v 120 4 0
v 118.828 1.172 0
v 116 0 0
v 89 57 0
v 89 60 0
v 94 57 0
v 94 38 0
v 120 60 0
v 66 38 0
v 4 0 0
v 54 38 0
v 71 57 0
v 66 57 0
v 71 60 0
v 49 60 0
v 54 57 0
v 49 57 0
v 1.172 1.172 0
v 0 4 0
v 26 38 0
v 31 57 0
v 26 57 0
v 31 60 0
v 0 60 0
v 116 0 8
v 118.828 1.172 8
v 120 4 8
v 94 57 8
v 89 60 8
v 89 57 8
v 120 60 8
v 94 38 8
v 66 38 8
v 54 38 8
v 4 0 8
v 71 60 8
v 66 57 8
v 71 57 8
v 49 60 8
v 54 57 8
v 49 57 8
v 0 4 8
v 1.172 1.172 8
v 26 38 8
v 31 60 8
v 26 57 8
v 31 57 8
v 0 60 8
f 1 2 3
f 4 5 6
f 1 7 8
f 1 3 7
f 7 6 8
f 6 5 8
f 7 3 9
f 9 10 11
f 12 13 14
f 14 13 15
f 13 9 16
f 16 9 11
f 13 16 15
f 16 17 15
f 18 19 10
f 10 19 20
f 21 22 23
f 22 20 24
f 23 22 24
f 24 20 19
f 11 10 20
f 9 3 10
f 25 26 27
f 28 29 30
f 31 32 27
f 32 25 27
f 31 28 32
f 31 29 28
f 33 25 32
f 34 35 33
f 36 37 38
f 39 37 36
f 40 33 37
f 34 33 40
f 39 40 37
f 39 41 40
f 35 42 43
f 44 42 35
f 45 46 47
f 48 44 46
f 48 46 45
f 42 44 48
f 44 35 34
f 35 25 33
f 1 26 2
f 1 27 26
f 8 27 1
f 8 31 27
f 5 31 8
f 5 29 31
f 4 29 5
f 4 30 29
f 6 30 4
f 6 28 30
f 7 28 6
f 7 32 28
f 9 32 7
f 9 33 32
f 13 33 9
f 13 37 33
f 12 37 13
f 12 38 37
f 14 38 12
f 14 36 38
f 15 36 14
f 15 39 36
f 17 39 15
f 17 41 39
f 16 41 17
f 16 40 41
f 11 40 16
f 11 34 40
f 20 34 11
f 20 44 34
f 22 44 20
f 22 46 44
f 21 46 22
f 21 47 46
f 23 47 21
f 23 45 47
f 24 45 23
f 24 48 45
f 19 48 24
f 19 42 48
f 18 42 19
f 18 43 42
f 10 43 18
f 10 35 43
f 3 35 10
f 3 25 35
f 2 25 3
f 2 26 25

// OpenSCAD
$fn = 32;

// ----------------------------------------------------------------------
// Oversize slot bar: 120 mm bar with 2 oversize windows
// ----------------------------------------------------------------------

// --- parameters (mm) ---
profile_height = 8;       // extrusion height
profile_points = 24;      // points of the closed outline

profile = [[0, 4], [1.172, 1.172], [4, 0], [116, 0], [118.828, 1.172], [120, 4], [120, 60], [89, 60], [89, 57], [94, 57], [94, 38], [66, 38], [66, 57], [71, 57], [71, 60], [49, 60], [49, 57], [54, 57], [54, 38], [26, 38], [26, 57], [31, 57], [31, 60], [0, 60]];  // single closed polygon, 24 points, counter clockwise

// --- the one profile operation ---
linear_extrude(height = profile_height) polygon(points = profile);
